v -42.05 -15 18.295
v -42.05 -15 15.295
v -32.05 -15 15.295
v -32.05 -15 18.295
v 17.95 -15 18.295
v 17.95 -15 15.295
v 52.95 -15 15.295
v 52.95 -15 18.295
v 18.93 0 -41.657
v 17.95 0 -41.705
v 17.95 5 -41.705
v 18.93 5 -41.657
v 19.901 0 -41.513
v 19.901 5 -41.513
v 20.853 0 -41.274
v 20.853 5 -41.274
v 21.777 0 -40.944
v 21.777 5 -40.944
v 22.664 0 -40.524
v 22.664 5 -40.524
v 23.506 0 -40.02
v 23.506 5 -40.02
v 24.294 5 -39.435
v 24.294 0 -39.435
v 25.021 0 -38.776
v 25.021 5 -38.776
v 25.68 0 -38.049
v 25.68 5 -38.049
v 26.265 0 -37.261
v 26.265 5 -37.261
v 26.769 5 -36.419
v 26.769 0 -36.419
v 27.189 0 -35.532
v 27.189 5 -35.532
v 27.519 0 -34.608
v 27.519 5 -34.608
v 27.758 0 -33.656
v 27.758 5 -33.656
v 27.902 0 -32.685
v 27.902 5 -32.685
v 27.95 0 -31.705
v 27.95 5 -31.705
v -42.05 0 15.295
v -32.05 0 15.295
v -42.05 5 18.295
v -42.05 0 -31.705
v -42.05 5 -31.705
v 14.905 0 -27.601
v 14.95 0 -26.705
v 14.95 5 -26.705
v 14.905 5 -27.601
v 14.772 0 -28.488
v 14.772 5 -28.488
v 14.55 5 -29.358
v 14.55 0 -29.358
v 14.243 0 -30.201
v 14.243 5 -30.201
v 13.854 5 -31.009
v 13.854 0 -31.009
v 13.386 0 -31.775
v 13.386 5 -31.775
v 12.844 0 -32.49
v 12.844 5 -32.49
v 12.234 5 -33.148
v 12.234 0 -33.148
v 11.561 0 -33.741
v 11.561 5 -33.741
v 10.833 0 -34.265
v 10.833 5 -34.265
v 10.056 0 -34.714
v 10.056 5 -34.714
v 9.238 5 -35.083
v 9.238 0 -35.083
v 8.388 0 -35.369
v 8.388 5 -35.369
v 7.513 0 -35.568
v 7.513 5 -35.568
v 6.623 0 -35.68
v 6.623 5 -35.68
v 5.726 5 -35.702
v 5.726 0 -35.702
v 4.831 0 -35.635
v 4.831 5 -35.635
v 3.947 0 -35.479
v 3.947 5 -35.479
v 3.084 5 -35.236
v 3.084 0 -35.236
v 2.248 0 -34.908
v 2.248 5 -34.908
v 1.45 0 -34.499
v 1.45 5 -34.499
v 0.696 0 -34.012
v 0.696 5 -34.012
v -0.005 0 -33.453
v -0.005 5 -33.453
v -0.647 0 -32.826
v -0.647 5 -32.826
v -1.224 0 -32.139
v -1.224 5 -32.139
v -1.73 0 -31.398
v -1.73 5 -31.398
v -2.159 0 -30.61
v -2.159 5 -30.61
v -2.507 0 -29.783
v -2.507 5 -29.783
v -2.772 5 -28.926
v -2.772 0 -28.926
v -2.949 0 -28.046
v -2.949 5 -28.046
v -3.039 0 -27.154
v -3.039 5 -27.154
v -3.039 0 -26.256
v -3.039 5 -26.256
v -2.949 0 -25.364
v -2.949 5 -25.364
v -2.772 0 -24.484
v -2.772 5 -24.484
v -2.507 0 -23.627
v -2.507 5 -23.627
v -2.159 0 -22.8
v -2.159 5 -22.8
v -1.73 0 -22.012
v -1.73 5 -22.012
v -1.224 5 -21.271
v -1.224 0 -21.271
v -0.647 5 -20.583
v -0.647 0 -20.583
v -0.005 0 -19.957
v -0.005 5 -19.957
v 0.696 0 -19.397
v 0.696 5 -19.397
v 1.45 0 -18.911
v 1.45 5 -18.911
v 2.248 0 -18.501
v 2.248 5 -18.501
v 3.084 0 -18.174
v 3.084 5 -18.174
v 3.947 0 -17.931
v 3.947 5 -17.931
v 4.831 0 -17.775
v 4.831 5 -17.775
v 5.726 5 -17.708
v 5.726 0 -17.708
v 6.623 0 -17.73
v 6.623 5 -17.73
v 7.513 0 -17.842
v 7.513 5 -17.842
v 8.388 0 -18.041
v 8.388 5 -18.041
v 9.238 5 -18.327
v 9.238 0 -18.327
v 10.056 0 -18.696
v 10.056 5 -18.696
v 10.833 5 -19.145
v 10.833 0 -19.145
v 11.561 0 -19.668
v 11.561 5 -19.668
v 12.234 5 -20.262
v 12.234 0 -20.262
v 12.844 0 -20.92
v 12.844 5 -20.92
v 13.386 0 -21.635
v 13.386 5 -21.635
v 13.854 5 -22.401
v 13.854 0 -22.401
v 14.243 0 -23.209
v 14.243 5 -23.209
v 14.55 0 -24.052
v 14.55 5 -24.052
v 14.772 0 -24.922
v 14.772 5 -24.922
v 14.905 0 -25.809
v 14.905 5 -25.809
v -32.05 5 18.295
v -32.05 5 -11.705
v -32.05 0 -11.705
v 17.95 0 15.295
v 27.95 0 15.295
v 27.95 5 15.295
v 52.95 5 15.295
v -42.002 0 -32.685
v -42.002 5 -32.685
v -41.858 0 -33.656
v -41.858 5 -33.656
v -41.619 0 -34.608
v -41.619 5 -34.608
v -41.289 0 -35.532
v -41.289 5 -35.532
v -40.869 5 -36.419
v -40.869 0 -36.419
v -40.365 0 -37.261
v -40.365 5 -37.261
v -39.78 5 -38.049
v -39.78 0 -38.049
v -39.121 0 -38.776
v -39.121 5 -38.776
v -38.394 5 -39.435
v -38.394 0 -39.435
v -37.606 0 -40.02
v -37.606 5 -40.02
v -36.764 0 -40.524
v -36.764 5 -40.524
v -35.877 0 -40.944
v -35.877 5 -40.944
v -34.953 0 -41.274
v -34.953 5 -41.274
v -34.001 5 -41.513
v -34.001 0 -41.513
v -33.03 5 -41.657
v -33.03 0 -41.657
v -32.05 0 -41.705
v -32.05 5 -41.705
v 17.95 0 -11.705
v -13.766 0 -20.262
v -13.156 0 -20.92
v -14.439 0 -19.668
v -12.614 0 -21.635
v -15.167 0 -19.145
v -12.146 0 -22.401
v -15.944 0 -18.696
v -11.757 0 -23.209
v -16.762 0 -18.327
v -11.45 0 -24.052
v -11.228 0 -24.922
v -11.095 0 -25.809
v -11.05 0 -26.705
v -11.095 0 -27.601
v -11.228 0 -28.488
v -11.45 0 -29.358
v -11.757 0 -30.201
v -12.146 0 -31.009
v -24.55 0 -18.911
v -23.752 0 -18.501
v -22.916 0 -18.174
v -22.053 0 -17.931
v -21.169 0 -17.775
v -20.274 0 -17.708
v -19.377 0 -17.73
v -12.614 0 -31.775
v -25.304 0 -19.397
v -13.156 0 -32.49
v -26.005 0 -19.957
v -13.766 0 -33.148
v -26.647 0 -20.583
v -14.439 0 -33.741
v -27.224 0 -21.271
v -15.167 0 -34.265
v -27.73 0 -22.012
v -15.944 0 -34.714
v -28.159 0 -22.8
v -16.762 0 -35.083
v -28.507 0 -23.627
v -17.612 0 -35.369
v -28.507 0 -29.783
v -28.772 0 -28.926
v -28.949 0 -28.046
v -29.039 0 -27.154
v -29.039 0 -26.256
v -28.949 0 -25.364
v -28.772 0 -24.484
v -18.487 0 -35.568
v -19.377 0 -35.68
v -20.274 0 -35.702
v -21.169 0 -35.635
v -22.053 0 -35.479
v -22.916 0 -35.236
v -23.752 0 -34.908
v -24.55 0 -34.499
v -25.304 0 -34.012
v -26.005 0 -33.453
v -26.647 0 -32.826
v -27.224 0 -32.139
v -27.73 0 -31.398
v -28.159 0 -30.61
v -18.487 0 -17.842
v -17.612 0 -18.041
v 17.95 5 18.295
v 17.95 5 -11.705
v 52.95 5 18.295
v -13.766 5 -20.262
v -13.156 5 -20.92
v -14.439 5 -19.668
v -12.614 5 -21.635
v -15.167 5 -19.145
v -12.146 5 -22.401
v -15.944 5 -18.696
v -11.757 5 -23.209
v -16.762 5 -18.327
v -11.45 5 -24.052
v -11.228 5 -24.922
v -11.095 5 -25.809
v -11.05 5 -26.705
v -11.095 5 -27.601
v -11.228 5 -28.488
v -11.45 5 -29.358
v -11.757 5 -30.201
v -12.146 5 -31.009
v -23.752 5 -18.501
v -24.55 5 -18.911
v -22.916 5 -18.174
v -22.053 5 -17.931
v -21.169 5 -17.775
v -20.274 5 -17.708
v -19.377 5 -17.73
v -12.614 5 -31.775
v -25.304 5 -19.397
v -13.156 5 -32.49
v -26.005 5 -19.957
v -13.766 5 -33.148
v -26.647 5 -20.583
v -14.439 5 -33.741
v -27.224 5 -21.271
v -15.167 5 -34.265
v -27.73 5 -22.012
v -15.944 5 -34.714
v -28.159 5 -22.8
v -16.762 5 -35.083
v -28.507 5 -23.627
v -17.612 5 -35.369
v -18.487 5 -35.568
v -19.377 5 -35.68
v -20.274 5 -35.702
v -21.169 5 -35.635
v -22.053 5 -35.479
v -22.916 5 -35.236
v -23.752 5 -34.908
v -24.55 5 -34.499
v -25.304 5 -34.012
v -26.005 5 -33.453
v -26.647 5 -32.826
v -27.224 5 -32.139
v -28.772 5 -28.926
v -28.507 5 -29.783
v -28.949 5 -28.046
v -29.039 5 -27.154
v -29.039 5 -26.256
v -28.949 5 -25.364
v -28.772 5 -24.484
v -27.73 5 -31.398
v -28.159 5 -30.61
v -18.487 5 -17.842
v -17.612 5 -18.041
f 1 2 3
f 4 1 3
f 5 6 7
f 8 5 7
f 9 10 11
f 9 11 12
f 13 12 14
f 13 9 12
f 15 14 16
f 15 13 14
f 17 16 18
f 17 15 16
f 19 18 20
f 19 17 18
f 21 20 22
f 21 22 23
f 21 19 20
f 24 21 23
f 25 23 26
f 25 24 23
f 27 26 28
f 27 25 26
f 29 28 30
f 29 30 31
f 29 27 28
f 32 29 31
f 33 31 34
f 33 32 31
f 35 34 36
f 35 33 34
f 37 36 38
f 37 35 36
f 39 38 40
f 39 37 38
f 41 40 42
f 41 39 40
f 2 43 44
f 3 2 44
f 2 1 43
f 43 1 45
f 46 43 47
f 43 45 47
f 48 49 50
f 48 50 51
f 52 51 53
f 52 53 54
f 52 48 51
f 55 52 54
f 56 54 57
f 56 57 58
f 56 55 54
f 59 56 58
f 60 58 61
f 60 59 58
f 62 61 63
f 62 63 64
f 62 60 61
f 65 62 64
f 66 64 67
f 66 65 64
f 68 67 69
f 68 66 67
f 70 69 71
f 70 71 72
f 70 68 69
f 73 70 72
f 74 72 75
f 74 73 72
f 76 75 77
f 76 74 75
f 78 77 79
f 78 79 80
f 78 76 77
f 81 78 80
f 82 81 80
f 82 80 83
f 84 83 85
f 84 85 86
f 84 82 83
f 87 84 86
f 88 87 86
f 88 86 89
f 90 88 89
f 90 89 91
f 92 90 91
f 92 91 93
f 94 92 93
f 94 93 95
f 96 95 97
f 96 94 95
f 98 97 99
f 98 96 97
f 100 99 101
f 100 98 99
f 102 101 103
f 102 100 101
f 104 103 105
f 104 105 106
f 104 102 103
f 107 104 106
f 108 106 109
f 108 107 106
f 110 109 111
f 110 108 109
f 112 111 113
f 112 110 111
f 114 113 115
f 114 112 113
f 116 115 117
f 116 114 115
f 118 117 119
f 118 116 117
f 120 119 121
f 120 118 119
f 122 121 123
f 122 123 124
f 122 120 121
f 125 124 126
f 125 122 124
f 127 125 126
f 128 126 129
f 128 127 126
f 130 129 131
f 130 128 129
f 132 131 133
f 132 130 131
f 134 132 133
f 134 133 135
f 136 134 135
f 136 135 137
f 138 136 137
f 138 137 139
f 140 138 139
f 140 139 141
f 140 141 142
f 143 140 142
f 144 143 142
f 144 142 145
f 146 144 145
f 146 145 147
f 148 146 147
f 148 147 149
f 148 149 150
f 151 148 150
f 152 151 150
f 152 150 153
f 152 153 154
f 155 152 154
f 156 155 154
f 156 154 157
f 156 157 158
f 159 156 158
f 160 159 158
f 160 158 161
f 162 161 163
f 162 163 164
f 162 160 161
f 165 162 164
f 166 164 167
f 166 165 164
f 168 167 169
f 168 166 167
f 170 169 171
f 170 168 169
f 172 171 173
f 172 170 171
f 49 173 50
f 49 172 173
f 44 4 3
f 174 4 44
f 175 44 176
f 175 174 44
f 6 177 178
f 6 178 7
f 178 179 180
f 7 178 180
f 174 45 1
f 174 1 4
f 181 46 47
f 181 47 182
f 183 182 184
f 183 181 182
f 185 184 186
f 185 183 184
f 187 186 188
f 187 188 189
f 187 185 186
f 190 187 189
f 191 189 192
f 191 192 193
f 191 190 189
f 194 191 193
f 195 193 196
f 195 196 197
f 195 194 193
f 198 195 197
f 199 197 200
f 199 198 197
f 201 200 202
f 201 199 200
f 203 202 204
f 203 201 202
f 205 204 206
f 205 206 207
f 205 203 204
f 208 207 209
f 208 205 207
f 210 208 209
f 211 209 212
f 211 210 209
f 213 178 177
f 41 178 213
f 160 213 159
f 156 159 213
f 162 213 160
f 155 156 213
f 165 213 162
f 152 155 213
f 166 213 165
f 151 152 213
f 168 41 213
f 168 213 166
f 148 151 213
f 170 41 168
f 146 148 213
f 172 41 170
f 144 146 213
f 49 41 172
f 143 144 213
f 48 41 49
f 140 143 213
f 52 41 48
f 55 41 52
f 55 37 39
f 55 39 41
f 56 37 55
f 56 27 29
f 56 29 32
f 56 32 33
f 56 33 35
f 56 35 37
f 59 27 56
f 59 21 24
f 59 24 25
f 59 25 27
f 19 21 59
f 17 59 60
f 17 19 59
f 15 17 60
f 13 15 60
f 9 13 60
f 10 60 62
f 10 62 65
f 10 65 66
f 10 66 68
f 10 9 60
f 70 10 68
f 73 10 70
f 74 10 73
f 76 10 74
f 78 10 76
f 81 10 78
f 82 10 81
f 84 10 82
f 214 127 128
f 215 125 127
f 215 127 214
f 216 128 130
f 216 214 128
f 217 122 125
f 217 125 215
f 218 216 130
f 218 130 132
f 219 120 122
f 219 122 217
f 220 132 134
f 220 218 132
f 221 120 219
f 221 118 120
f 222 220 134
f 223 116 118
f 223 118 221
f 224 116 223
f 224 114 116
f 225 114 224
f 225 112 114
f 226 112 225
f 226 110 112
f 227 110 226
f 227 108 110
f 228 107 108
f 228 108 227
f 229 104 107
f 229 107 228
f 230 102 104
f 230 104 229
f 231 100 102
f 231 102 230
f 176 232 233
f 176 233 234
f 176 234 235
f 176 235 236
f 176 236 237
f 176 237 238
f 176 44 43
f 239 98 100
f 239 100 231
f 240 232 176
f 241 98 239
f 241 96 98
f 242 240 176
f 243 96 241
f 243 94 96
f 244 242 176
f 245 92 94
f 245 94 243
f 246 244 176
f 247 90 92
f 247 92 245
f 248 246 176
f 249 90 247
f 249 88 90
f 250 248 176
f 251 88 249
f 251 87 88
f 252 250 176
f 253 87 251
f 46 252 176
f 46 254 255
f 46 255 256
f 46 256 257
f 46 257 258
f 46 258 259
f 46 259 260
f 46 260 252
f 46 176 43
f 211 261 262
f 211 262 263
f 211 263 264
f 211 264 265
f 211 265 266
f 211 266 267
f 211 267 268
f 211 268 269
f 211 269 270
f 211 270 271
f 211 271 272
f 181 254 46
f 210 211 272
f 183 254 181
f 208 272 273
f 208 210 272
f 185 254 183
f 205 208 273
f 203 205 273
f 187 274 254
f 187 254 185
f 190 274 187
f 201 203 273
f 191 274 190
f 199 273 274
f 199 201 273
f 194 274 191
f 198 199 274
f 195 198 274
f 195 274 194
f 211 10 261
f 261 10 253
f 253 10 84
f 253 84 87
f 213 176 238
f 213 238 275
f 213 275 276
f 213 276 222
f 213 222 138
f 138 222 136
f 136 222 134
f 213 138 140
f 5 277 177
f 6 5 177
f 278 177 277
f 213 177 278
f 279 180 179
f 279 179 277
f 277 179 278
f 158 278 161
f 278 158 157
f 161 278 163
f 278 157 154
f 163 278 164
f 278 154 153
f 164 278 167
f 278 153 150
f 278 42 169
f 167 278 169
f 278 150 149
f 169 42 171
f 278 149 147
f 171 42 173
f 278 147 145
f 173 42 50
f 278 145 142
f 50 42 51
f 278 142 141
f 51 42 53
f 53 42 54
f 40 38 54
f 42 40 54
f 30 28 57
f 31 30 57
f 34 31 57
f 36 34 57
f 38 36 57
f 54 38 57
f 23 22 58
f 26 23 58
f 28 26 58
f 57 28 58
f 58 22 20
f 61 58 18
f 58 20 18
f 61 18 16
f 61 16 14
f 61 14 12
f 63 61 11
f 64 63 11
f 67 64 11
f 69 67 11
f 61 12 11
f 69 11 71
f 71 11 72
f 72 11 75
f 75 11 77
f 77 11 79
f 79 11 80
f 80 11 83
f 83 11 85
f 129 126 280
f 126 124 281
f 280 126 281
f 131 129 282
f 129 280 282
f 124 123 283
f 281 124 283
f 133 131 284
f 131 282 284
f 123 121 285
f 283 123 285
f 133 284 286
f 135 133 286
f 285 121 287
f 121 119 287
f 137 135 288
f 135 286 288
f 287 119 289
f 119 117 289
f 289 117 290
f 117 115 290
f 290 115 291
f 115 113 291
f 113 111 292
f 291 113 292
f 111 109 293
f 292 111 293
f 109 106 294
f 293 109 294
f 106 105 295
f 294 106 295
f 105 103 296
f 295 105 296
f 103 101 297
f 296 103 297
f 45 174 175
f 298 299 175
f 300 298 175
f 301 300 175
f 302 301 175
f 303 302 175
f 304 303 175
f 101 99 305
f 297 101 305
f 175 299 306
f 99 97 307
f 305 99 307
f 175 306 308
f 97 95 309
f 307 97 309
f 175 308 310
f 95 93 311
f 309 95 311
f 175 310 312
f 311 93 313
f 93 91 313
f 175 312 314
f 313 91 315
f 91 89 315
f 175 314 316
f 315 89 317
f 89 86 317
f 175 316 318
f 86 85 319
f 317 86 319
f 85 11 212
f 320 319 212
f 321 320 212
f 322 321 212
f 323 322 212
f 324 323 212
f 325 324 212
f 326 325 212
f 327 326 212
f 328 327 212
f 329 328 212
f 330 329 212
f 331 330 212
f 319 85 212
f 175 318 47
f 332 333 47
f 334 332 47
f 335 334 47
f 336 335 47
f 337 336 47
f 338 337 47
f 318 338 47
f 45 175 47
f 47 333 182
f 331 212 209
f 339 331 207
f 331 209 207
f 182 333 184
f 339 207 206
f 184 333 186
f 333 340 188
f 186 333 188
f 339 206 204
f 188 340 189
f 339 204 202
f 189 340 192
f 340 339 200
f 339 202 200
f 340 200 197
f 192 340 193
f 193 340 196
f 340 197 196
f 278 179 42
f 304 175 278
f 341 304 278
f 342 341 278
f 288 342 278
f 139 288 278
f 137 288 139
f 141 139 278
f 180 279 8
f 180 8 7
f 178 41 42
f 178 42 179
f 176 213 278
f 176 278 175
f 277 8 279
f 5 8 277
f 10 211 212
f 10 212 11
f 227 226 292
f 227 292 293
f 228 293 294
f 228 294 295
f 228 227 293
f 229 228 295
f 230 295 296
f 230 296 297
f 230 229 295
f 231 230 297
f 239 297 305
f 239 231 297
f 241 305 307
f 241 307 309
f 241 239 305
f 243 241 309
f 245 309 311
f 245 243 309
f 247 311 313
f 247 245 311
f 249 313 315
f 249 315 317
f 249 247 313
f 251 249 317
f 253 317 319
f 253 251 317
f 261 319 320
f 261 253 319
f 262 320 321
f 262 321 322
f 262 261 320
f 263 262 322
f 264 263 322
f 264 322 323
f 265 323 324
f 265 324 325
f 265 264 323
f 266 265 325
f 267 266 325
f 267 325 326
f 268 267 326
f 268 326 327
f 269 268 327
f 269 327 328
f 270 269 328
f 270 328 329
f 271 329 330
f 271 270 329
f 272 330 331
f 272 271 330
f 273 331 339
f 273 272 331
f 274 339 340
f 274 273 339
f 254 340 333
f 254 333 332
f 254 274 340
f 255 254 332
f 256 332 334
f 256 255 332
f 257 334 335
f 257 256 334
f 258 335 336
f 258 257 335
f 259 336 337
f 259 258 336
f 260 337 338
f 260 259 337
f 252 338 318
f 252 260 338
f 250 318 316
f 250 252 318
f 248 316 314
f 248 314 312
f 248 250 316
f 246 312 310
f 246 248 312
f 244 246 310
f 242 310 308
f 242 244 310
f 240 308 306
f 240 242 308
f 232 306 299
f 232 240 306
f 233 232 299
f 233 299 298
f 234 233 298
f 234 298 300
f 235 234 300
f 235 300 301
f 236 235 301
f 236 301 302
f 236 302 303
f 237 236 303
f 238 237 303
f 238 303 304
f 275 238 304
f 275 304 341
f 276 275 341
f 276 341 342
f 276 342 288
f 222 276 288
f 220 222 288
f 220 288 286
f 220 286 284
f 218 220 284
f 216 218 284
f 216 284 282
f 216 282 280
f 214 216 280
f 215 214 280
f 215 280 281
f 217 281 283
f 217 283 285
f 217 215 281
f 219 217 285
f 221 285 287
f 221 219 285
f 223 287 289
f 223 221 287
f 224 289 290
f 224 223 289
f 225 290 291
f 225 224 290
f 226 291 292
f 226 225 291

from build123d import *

# Parameters (mm, degrees)
ESQUISSE3_R        = 9
BOSS_EXTRU_1_DEPTH = 5
ESQUISSE4_W        = 10
ESQUISSE4_H        = 3
ESQUISSE4_W_2      = 35
BOSS_EXTRU_2_DEPTH = 20


with BuildPart() as part:
    # Esquisse3 → Boss.-Extru.1 (new body)
    with BuildSketch(Plane(origin=(0, 0, 0), x_dir=(1, 0, 0), z_dir=(0, 1, 0))):
        with BuildLine():
            Line((-42.049920388, -18.295081967), (-42.049920388, 31.704918033))
            ThreePointArc((-42.049920388, 31.704918033), (-39.120988199, 38.775985845), (-32.049920388, 41.704918033))
            Line((-32.049920388, 41.704918033), (17.950079612, 41.704918033))
            ThreePointArc((17.950079612, 41.704918033), (25.021147424, 38.775985845), (27.950079612, 31.704918033))
            Line((27.950079612, 31.704918033), (27.950079612, -15.295081967))
            Line((27.950079612, -15.295081967), (52.950079612, -15.295081967))
            Line((52.950079612, -15.295081967), (52.950079612, -18.295081967))
            Line((52.950079612, -18.295081967), (17.950079612, -18.295081967))
            Line((17.950079612, -18.295081967), (17.950079612, 11.704918033))
            Line((17.950079612, 11.704918033), (-32.049920388, 11.704918033))
            Line((-32.049920388, 11.704918033), (-32.049920388, -18.295081967))
            Line((-32.049920388, -18.295081967), (-42.049920388, -18.295081967))
        make_face()
        with Locations((-20.049920388, 26.704918033)):
            Circle(ESQUISSE3_R, mode=Mode.SUBTRACT)
        with Locations((5.950079612, 26.704918033)):
            Circle(ESQUISSE3_R, mode=Mode.SUBTRACT)
    extrude(amount=BOSS_EXTRU_1_DEPTH)

    # Esquisse4 → Boss.-Extru.2 (add)
    with BuildSketch(Plane(origin=(0, 5, 0), x_dir=(1, 0, 0), z_dir=(0, 1, 0))):
        with Locations((-37.049920388, -16.795081967)):
            Rectangle(ESQUISSE4_W, ESQUISSE4_H)
        with Locations((35.450079612, -16.795081967)):
            Rectangle(ESQUISSE4_W_2, ESQUISSE4_H)
    extrude(amount=-BOSS_EXTRU_2_DEPTH)


solid = part.part
